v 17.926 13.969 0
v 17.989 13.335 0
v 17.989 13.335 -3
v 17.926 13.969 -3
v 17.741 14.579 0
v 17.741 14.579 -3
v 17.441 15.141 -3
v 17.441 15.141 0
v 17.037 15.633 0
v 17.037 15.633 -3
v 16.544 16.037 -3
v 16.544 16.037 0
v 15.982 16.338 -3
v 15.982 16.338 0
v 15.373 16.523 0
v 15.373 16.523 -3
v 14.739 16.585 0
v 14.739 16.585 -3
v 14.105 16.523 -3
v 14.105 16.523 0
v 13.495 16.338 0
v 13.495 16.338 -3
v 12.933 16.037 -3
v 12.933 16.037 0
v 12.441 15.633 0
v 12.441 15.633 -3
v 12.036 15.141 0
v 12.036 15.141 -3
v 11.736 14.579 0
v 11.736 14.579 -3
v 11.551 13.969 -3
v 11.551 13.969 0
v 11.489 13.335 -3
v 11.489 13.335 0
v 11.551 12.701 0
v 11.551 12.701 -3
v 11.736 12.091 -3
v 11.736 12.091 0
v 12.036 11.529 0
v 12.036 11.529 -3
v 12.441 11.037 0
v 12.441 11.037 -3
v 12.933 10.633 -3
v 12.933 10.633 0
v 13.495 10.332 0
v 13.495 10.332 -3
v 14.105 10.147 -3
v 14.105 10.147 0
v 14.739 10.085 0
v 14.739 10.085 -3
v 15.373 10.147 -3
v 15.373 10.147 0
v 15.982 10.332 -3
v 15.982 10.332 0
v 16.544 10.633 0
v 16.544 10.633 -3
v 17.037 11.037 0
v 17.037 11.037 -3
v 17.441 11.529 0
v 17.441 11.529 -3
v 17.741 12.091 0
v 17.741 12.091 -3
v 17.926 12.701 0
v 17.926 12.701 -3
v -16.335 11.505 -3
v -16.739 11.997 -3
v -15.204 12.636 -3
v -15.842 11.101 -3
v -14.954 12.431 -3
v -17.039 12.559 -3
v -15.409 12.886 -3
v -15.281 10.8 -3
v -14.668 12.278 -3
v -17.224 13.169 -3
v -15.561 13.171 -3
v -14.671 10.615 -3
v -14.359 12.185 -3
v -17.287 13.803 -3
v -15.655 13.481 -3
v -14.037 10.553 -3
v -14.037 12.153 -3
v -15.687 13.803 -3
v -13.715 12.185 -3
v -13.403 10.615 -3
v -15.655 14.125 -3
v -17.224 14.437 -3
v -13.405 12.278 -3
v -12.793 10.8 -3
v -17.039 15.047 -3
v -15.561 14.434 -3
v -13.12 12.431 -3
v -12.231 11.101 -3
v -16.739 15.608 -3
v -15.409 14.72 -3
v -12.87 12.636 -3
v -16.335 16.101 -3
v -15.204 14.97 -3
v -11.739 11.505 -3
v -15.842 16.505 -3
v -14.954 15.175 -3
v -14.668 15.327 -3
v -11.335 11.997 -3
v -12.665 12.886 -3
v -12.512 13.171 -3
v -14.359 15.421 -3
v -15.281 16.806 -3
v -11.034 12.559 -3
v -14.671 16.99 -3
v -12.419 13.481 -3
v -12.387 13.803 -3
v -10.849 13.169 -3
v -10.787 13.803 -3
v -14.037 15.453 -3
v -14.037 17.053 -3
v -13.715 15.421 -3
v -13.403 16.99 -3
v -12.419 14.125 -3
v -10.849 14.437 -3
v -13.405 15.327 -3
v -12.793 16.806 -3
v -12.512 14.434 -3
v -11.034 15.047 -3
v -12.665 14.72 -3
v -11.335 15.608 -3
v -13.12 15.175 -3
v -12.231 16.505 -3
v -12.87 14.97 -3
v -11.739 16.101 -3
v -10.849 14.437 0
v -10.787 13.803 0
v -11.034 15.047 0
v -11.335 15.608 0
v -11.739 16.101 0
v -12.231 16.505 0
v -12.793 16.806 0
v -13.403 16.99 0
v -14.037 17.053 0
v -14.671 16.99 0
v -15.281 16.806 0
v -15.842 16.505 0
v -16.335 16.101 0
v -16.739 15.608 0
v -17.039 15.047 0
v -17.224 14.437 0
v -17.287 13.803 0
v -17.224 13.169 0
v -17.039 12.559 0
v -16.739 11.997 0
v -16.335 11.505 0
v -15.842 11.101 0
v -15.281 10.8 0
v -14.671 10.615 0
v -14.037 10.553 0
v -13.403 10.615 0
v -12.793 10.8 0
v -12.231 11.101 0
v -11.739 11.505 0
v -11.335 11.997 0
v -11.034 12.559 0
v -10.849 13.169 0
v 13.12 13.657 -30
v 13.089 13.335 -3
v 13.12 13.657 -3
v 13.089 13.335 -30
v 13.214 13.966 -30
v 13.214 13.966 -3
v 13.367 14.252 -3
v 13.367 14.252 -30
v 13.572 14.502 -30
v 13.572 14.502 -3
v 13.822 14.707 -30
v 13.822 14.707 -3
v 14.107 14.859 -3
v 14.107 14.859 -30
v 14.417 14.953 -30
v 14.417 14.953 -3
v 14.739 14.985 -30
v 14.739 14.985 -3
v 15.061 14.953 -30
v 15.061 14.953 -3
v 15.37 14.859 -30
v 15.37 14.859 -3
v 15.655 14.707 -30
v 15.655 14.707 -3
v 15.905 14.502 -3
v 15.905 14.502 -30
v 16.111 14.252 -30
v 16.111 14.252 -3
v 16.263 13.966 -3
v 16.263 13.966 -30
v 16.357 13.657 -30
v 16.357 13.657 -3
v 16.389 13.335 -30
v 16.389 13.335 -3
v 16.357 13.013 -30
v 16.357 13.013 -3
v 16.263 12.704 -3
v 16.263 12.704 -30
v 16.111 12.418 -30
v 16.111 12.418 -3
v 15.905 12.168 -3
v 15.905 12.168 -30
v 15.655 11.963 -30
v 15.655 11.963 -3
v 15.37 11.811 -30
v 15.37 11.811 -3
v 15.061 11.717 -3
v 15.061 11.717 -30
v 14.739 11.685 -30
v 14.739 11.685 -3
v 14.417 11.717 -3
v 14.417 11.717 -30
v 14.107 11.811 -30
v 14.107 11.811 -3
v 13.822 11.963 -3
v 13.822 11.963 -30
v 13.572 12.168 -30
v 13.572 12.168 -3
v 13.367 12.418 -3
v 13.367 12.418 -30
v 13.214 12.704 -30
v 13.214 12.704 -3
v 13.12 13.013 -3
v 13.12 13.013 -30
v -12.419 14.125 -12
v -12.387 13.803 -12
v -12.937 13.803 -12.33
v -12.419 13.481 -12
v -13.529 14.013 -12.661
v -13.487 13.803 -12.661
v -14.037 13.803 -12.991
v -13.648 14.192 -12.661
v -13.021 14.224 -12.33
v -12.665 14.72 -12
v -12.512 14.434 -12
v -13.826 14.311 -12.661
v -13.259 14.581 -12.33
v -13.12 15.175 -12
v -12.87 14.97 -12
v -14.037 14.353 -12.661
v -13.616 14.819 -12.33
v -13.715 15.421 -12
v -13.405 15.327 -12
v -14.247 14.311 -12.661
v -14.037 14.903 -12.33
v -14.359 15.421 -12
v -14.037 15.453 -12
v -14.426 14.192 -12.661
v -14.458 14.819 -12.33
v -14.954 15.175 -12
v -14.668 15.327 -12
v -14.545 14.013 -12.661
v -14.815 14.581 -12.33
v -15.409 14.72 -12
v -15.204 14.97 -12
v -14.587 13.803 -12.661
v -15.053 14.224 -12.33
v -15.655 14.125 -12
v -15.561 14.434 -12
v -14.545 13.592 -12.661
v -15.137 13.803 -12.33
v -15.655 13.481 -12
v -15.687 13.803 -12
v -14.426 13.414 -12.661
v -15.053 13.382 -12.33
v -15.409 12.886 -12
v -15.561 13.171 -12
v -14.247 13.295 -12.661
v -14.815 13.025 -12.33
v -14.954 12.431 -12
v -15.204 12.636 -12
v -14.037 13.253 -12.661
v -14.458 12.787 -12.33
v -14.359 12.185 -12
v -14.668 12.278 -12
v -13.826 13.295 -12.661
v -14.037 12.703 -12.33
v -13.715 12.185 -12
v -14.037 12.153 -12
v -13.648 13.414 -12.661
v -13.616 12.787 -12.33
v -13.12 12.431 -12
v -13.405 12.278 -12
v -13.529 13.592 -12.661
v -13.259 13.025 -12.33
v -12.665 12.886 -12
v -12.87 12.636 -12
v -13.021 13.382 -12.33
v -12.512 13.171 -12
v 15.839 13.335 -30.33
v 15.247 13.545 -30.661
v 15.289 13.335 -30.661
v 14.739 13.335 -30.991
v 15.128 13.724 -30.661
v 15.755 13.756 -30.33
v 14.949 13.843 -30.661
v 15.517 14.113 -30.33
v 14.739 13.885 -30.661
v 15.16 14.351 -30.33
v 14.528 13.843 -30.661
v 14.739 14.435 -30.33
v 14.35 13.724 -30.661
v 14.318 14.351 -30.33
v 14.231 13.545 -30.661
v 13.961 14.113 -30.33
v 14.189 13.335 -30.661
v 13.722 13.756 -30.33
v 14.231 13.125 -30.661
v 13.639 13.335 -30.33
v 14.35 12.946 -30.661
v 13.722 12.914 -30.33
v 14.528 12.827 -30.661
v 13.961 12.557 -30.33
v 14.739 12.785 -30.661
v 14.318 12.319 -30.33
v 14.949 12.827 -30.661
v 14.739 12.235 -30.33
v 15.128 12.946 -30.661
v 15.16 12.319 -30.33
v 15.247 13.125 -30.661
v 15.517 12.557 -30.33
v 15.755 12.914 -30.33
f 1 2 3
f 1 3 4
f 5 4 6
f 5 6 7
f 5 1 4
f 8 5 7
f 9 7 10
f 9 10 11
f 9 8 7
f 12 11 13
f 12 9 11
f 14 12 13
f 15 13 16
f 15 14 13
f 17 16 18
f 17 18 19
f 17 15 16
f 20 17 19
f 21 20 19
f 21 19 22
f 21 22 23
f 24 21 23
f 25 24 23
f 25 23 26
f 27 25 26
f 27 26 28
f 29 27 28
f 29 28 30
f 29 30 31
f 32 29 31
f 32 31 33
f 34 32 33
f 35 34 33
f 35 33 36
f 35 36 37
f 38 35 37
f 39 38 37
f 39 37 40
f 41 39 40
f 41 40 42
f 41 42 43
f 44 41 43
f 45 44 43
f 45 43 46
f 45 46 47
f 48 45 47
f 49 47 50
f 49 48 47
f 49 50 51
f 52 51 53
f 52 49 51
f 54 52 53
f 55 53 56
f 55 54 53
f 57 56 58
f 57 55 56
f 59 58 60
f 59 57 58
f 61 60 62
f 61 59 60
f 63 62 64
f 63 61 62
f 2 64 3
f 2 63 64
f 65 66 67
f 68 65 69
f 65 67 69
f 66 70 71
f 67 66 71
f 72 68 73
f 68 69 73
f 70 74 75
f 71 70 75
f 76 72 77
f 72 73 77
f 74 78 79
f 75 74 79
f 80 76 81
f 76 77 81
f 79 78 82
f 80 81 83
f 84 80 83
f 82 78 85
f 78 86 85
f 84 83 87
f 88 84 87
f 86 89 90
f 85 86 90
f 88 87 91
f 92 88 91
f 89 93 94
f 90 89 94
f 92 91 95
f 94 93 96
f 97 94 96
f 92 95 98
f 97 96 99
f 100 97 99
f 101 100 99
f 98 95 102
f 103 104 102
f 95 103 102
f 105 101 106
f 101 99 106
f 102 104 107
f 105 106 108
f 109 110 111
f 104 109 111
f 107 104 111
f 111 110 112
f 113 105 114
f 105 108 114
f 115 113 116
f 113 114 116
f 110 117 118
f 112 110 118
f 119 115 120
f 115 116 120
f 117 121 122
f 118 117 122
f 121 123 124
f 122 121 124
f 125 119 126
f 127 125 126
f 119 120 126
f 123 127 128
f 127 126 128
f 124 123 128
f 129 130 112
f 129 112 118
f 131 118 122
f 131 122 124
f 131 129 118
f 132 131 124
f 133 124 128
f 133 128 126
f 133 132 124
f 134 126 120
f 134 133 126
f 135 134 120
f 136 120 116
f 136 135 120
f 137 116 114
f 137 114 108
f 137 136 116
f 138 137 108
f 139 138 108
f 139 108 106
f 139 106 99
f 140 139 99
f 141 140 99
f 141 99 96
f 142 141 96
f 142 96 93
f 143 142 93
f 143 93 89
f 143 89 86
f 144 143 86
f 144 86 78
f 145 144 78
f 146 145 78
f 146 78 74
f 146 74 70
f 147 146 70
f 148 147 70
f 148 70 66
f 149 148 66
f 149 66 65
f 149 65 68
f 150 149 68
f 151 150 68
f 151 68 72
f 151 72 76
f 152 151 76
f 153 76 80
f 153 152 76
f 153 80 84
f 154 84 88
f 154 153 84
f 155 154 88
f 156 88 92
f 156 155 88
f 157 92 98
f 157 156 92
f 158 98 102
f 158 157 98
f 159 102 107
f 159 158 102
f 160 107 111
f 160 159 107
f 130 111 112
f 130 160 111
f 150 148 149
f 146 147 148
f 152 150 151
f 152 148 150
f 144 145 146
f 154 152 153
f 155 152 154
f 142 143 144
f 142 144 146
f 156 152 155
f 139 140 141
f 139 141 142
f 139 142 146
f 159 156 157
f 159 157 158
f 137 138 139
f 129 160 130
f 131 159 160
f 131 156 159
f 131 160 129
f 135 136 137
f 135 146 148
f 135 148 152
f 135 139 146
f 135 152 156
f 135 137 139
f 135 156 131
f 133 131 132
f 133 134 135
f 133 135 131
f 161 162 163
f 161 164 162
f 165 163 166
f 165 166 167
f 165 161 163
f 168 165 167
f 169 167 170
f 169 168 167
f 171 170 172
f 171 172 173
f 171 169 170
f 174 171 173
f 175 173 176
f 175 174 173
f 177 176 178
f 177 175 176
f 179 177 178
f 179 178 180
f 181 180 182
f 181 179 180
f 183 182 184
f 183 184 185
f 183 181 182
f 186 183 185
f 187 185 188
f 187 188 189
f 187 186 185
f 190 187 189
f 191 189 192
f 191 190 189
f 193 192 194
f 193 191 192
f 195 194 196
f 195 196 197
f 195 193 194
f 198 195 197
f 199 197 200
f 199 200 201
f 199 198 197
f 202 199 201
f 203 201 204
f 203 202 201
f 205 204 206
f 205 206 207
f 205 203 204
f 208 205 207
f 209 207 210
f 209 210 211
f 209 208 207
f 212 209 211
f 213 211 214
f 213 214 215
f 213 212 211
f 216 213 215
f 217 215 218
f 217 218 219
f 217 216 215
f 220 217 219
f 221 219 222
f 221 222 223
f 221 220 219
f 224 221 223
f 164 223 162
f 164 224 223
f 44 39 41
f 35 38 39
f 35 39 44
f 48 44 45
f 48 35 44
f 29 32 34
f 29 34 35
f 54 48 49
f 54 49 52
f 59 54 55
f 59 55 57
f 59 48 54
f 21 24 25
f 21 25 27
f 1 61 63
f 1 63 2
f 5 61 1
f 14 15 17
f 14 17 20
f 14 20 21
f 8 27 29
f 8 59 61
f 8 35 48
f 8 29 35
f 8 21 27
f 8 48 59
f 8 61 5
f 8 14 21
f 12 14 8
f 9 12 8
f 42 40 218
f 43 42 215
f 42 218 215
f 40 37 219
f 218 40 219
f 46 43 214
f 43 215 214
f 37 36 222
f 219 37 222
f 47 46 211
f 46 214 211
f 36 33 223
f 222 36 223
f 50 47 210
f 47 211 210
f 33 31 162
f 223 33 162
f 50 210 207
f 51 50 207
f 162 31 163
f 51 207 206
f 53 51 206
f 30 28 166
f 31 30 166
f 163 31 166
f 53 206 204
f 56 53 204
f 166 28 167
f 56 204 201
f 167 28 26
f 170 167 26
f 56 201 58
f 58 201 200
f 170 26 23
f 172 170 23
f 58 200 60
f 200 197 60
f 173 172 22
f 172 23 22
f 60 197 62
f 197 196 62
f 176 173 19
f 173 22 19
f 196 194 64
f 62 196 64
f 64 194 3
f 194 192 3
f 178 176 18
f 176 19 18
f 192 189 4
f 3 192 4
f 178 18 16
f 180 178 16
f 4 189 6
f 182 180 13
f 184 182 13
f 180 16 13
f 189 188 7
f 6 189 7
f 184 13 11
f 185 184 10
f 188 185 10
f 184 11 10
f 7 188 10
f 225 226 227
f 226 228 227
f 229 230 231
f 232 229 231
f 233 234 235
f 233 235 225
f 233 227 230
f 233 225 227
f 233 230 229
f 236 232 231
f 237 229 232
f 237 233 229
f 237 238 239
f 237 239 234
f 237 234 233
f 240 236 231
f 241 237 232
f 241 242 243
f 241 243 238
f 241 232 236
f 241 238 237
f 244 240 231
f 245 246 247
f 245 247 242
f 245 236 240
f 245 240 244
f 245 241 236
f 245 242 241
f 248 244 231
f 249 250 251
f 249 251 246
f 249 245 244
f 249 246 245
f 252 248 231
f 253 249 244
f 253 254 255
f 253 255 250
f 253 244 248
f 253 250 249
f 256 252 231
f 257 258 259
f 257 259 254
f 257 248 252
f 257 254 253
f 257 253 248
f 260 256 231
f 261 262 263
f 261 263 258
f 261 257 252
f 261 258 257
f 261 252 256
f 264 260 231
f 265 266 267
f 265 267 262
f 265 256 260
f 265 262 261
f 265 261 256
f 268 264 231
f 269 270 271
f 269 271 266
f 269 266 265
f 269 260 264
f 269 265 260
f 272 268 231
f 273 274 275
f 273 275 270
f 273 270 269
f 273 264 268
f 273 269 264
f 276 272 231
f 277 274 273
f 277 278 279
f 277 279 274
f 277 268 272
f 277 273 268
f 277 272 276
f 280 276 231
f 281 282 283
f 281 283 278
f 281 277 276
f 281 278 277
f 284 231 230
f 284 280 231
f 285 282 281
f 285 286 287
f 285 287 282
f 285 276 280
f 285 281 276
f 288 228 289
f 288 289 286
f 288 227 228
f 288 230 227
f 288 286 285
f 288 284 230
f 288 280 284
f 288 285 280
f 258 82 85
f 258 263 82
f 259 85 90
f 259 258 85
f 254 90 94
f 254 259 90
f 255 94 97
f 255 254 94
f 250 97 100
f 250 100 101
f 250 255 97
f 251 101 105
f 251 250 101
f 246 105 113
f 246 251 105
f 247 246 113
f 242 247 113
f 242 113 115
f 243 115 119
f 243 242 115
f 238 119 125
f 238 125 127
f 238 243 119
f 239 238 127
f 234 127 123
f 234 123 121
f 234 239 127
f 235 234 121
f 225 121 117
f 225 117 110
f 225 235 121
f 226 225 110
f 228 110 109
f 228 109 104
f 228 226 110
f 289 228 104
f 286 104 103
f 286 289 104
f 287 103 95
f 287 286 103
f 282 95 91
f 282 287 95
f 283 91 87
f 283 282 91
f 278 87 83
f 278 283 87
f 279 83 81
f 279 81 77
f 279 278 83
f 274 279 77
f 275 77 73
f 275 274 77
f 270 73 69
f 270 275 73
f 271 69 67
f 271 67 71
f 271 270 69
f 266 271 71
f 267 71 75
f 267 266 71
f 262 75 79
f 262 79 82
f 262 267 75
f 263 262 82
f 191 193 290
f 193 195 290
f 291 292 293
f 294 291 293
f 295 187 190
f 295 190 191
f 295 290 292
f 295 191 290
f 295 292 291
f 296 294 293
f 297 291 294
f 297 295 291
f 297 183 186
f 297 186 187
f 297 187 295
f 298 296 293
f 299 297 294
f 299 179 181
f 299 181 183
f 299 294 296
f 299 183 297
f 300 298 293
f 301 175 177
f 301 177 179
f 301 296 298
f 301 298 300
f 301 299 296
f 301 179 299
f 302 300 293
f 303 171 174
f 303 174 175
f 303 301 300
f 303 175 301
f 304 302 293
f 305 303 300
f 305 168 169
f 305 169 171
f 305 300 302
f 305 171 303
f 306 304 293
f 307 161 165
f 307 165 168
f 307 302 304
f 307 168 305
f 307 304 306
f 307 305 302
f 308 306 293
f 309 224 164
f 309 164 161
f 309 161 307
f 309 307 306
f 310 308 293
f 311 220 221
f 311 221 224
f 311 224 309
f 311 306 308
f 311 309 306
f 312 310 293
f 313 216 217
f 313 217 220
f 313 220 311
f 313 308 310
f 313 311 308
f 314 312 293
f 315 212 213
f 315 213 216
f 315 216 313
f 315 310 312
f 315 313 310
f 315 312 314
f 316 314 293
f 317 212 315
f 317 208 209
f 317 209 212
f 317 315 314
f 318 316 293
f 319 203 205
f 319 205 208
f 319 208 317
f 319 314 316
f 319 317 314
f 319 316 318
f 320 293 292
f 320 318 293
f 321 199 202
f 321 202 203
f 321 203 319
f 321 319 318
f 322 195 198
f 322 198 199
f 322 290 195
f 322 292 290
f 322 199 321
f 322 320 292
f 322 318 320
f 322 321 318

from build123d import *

# Parameters (mm, degrees)
F0_W           = 59.422634542
F0_H           = 58.0189451575
F1_DEPTH       = 78.994
F2_D           = 3.3
F2_DEPTH       = 12
F2_CBORE_D     = 6.5
F2_CBORE_DEPTH = 3
F2_TIP         = 0.9914200214
F3_D           = 3.3
F3_DEPTH       = 30
F3_CBORE_D     = 6.5
F3_CBORE_DEPTH = 3
F3_TIP         = 0.9914200214
F4_DEPTH       = 78.994


with BuildPart() as f1:
    # F0 (on Top) → F1 (new body)
    with BuildSketch(Plane.XY):
        Rectangle(F0_W, F0_H)
    extrude(amount=-F1_DEPTH)

    # F2
    with Locations(Plane.XY):
        with Locations((-14.0368444845, 13.8028943911)):
            CounterBoreHole(F2_D / 2, F2_CBORE_D / 2, F2_CBORE_DEPTH, depth=F2_DEPTH)
            with Locations((0, 0, -(F2_DEPTH + F2_TIP / 2))):  # 118° drill point
                Cone(0, F2_D / 2, F2_TIP, mode=Mode.SUBTRACT)

    # F3
    with Locations(Plane.XY):
        with Locations((14.7386826575, 13.3350007236)):
            CounterBoreHole(F3_D / 2, F3_CBORE_D / 2, F3_CBORE_DEPTH, depth=F3_DEPTH)
            with Locations((0, 0, -(F3_DEPTH + F3_TIP / 2))):  # 118° drill point
                Cone(0, F3_D / 2, F3_TIP, mode=Mode.SUBTRACT)


with BuildPart() as f4:
    # F4 (new, through all): a face of the model
    f4_faces = [f1.part.faces().sort_by_distance(p)[0] for p in [
        (0, 0, -78.994),
    ]]
    extrude(f4_faces, amount=-F4_DEPTH)

    # F5: cut F1
    add(f1.part, mode=Mode.SUBTRACT)


solid = f4.part
